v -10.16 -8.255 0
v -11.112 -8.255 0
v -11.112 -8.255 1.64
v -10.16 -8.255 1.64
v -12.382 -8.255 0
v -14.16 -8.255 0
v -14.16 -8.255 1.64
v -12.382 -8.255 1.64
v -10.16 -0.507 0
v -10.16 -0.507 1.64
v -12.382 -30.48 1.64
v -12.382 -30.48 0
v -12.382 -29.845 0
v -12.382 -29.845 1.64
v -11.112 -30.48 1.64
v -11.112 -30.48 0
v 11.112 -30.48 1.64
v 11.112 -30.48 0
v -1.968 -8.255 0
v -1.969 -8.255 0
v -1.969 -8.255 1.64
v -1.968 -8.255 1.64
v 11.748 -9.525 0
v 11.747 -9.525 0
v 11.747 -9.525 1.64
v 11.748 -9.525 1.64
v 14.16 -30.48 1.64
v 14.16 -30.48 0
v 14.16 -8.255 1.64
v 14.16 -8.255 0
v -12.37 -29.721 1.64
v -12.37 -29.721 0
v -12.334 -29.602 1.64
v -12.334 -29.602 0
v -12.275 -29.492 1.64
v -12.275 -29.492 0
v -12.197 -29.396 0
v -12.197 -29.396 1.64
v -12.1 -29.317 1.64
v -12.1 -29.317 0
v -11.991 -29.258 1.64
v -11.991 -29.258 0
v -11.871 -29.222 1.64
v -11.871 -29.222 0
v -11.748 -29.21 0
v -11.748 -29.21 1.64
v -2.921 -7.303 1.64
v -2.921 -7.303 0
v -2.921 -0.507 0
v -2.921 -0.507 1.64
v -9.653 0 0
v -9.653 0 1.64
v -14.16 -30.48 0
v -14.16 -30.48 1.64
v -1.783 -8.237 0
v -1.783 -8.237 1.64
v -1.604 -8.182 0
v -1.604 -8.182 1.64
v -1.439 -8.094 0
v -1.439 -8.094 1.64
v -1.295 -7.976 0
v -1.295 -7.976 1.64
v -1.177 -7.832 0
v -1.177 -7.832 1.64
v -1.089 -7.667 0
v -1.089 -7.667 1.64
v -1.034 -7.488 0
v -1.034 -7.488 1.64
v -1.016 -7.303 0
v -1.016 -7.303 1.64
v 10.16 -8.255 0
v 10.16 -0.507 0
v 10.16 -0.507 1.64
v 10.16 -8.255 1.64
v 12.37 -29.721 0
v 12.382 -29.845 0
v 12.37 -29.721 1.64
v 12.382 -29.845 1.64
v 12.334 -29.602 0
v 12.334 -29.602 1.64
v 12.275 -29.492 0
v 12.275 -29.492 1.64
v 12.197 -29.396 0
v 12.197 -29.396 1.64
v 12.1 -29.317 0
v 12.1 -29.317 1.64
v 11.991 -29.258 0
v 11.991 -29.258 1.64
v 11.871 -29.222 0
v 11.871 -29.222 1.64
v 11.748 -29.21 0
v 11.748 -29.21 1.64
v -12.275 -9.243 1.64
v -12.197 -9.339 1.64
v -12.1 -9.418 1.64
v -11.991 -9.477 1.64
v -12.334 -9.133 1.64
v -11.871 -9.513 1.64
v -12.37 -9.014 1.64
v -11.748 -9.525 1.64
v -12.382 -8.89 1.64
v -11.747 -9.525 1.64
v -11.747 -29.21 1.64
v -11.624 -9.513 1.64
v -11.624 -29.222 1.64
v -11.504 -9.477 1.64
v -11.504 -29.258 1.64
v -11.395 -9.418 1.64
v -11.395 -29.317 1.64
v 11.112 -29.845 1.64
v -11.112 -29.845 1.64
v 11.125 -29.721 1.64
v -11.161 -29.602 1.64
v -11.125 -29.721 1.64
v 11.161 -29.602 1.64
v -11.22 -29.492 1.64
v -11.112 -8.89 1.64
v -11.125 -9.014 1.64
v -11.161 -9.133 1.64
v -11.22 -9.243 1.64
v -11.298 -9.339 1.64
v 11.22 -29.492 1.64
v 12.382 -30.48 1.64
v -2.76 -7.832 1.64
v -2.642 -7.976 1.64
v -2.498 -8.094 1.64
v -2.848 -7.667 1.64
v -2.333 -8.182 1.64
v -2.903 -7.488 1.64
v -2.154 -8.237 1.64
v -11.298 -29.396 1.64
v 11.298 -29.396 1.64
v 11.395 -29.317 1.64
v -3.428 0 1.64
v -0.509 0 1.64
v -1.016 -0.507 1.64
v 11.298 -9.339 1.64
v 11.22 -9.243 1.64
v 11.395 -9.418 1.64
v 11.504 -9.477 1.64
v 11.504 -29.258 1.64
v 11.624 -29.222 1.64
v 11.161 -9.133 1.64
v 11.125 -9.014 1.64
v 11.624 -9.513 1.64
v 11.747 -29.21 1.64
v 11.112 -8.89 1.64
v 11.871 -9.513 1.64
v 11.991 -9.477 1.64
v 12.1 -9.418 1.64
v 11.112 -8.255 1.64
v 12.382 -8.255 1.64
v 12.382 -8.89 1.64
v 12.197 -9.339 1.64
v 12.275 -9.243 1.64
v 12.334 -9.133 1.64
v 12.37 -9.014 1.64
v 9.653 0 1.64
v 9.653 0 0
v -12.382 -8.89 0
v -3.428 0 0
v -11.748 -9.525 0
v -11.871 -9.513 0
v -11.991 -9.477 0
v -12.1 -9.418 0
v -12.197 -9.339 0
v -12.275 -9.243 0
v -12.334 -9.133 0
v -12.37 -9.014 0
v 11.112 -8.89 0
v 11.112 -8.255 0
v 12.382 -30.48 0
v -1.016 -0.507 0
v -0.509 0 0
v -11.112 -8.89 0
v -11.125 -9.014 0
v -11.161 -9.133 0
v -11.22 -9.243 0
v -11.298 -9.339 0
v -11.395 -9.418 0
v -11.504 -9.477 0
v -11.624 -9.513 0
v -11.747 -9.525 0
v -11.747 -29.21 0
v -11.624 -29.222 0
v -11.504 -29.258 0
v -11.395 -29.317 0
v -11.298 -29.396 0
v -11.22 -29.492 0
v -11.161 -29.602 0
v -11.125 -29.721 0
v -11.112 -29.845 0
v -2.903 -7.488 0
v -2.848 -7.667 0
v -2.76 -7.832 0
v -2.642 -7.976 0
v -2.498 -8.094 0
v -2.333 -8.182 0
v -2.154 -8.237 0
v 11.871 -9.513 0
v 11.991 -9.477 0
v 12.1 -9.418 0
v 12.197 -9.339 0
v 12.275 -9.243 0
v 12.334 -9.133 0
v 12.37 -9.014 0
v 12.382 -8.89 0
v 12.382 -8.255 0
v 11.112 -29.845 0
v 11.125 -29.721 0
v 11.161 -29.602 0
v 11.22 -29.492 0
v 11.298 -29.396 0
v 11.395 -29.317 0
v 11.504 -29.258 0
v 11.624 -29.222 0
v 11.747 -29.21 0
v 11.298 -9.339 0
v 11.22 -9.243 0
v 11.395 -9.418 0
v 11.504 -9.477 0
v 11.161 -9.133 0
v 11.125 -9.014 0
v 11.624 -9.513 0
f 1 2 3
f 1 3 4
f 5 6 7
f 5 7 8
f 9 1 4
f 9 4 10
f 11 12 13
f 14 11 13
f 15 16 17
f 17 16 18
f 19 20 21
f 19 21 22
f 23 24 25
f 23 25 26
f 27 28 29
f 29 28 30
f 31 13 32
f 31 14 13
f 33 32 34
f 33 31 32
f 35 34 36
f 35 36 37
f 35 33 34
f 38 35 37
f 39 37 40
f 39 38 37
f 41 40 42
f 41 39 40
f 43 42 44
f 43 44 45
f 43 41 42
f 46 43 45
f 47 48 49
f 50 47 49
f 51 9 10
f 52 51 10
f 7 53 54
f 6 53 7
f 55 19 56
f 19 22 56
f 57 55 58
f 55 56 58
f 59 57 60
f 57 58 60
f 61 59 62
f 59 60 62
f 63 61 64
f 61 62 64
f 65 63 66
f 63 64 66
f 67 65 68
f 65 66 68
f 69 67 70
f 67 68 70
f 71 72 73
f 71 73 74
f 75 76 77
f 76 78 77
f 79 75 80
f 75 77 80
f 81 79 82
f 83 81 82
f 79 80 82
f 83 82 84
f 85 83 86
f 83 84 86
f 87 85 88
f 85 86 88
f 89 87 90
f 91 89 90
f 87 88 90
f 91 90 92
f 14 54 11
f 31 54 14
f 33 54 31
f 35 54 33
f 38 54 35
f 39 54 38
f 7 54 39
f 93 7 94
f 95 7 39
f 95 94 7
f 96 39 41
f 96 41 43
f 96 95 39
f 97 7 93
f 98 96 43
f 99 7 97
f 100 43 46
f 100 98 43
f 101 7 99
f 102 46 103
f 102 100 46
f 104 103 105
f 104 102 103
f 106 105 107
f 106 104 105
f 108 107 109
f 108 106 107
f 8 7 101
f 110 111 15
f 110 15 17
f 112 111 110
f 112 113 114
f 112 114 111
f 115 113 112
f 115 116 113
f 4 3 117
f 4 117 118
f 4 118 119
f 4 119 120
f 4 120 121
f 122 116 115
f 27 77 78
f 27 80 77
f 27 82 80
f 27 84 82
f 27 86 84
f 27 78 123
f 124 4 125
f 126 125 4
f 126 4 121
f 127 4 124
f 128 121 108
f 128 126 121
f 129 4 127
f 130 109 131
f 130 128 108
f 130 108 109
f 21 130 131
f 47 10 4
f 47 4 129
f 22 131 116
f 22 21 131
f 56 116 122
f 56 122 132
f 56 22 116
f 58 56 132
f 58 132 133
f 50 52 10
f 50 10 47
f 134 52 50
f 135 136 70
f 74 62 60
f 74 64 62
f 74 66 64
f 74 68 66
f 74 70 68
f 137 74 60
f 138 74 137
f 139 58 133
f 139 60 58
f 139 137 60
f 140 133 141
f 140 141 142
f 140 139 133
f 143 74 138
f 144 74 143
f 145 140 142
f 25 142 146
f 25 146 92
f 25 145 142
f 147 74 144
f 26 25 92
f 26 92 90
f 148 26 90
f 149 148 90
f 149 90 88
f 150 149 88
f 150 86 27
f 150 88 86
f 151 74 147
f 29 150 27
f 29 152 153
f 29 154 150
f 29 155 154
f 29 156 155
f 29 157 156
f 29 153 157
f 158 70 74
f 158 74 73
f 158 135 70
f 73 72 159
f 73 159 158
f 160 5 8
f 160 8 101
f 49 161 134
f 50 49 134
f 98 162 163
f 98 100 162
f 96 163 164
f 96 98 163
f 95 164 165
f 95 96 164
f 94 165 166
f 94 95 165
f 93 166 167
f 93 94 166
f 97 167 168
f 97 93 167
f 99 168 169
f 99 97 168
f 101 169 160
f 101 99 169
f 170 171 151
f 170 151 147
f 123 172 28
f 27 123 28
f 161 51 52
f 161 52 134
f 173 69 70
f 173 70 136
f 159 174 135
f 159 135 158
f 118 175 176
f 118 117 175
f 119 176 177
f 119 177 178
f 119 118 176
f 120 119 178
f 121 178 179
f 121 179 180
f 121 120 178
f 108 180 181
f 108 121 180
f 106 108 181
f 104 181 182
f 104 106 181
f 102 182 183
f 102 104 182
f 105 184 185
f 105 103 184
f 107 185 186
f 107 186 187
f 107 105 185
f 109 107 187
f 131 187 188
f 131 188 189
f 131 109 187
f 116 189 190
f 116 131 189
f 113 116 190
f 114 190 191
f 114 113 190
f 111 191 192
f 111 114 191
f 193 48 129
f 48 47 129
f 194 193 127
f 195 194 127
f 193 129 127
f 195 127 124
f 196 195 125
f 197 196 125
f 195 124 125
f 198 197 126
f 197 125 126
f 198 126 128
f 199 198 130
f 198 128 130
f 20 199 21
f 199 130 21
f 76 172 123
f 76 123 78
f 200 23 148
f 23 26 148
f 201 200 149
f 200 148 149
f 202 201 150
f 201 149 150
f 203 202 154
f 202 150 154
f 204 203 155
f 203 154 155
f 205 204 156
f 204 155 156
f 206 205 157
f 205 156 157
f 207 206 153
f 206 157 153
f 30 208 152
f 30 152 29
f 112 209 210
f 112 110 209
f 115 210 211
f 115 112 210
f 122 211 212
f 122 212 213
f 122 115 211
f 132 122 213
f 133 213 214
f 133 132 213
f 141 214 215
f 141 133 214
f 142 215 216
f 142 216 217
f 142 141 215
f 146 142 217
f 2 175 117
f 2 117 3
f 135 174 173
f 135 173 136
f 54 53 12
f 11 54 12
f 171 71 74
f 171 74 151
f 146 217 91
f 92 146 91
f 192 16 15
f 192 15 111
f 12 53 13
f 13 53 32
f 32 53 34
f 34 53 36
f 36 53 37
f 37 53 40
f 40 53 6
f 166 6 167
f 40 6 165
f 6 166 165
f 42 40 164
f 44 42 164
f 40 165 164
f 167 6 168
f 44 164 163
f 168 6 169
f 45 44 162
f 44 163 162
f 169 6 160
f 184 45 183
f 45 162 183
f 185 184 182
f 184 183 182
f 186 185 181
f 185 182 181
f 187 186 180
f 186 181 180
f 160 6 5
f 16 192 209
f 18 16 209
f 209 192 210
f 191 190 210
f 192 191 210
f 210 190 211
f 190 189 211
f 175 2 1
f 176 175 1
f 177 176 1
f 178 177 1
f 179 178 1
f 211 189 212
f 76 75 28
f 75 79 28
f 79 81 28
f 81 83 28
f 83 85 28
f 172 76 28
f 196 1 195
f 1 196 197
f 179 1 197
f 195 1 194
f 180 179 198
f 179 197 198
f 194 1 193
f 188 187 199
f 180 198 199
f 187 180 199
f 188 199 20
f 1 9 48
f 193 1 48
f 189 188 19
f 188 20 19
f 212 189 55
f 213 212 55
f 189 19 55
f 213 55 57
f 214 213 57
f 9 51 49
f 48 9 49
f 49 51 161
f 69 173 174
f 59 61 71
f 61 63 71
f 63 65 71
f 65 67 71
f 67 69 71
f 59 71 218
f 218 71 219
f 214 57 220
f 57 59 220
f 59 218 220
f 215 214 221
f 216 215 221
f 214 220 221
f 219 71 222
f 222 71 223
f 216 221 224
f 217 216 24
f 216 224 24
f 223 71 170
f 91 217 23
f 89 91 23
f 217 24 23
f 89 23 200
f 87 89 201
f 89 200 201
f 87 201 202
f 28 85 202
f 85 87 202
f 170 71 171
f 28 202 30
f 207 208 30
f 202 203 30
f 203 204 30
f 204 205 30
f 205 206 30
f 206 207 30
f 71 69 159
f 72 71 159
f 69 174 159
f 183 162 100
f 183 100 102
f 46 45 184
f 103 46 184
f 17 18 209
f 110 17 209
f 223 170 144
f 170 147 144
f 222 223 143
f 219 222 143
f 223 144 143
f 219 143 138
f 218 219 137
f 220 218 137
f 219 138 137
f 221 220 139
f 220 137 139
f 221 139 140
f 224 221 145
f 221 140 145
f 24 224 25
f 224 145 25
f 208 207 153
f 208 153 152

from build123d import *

# Parameters (mm, degrees)
F0_W     = 28.321
F0_H     = 30.48
F1_DEPTH = 1.64
F2_W     = 1.905
F2_H     = 8.255
F2_W_2   = 1.27
F2_H_2   = 1.27
F3_DEPTH = 25
F4_R     = 0.95249
F5_SIZE  = 0.507
F6_R     = 0.63499


# Not quite as in the source:
# - a fillet or chamfer is up to 0.001 mm smaller than in the source, because OpenCascade refuses the exact size


with BuildPart() as f1:
    # F0 (on Top) → F1 (new body)
    with BuildSketch(Plane.XY):
        with Locations((0, -15.24)):
            Rectangle(F0_W, F0_H)
    extrude(amount=F1_DEPTH)

    # F2 (on Top) → F3 (cut)
    with BuildSketch(Plane.XY):
        Polygon((-10.16, 0), (-14.1605, 0), (-14.1605, -8.255), (-12.3825, -8.255), (-12.3825, -9.525), (-11.1125, -9.525), (-11.1125, -8.255), (-10.16, -8.255), align=None)
        with Locations((-1.9685, -4.1275)):
            Rectangle(F2_W, F2_H)
        Polygon((14.1605, -8.255), (14.1605, 0), (10.16, 0), (10.16, -8.255), (11.1125, -8.255), (11.1125, -9.525), (12.3825, -9.525), (12.3825, -8.255), align=None)
        with Locations((-11.7475, -29.845)):
            Rectangle(F2_W_2, F2_H_2)
        with Locations((11.7475, -29.845)):
            Rectangle(F2_W_2, F2_H_2)
    extrude(amount=F3_DEPTH, mode=Mode.SUBTRACT)

    # F4 (radius 0.9525 in the source; OpenCascade refuses exactly that, so slightly less here)
    f4_edges = [f1.edges().sort_by_distance(p)[0] for p in [
        (-2.921, -8.255, 0.82),
        (-1.016, -8.255, 0.82),
    ]]
    fillet(f4_edges, radius=F4_R)

    # F5
    f5_edges = [f1.edges().sort_by_distance(p)[0] for p in [
        (10.16, 0, 0.82),
        (-1.016, 0, 0.82),
        (-2.921, 0, 0.82),
        (-10.16, 0, 0.82),
    ]]
    chamfer(f5_edges, length=F5_SIZE)

    # F6 (radius 0.635 in the source; OpenCascade refuses exactly that, so slightly less here)
    f6_edges = [f1.edges().sort_by_distance(p)[0] for p in [
        (12.3825, -29.21, 0.82),
        (-12.3825, -29.21, 0.82),
        (-11.1125, -29.21, 0.82),
        (11.1125, -29.21, 0.82),
        (11.1125, -9.525, 0.82),
        (12.3825, -9.525, 0.82),
        (-12.3825, -9.525, 0.82),
        (-11.1125, -9.525, 0.82),
    ]]
    fillet(f6_edges, radius=F6_R)


solid = f1.part
